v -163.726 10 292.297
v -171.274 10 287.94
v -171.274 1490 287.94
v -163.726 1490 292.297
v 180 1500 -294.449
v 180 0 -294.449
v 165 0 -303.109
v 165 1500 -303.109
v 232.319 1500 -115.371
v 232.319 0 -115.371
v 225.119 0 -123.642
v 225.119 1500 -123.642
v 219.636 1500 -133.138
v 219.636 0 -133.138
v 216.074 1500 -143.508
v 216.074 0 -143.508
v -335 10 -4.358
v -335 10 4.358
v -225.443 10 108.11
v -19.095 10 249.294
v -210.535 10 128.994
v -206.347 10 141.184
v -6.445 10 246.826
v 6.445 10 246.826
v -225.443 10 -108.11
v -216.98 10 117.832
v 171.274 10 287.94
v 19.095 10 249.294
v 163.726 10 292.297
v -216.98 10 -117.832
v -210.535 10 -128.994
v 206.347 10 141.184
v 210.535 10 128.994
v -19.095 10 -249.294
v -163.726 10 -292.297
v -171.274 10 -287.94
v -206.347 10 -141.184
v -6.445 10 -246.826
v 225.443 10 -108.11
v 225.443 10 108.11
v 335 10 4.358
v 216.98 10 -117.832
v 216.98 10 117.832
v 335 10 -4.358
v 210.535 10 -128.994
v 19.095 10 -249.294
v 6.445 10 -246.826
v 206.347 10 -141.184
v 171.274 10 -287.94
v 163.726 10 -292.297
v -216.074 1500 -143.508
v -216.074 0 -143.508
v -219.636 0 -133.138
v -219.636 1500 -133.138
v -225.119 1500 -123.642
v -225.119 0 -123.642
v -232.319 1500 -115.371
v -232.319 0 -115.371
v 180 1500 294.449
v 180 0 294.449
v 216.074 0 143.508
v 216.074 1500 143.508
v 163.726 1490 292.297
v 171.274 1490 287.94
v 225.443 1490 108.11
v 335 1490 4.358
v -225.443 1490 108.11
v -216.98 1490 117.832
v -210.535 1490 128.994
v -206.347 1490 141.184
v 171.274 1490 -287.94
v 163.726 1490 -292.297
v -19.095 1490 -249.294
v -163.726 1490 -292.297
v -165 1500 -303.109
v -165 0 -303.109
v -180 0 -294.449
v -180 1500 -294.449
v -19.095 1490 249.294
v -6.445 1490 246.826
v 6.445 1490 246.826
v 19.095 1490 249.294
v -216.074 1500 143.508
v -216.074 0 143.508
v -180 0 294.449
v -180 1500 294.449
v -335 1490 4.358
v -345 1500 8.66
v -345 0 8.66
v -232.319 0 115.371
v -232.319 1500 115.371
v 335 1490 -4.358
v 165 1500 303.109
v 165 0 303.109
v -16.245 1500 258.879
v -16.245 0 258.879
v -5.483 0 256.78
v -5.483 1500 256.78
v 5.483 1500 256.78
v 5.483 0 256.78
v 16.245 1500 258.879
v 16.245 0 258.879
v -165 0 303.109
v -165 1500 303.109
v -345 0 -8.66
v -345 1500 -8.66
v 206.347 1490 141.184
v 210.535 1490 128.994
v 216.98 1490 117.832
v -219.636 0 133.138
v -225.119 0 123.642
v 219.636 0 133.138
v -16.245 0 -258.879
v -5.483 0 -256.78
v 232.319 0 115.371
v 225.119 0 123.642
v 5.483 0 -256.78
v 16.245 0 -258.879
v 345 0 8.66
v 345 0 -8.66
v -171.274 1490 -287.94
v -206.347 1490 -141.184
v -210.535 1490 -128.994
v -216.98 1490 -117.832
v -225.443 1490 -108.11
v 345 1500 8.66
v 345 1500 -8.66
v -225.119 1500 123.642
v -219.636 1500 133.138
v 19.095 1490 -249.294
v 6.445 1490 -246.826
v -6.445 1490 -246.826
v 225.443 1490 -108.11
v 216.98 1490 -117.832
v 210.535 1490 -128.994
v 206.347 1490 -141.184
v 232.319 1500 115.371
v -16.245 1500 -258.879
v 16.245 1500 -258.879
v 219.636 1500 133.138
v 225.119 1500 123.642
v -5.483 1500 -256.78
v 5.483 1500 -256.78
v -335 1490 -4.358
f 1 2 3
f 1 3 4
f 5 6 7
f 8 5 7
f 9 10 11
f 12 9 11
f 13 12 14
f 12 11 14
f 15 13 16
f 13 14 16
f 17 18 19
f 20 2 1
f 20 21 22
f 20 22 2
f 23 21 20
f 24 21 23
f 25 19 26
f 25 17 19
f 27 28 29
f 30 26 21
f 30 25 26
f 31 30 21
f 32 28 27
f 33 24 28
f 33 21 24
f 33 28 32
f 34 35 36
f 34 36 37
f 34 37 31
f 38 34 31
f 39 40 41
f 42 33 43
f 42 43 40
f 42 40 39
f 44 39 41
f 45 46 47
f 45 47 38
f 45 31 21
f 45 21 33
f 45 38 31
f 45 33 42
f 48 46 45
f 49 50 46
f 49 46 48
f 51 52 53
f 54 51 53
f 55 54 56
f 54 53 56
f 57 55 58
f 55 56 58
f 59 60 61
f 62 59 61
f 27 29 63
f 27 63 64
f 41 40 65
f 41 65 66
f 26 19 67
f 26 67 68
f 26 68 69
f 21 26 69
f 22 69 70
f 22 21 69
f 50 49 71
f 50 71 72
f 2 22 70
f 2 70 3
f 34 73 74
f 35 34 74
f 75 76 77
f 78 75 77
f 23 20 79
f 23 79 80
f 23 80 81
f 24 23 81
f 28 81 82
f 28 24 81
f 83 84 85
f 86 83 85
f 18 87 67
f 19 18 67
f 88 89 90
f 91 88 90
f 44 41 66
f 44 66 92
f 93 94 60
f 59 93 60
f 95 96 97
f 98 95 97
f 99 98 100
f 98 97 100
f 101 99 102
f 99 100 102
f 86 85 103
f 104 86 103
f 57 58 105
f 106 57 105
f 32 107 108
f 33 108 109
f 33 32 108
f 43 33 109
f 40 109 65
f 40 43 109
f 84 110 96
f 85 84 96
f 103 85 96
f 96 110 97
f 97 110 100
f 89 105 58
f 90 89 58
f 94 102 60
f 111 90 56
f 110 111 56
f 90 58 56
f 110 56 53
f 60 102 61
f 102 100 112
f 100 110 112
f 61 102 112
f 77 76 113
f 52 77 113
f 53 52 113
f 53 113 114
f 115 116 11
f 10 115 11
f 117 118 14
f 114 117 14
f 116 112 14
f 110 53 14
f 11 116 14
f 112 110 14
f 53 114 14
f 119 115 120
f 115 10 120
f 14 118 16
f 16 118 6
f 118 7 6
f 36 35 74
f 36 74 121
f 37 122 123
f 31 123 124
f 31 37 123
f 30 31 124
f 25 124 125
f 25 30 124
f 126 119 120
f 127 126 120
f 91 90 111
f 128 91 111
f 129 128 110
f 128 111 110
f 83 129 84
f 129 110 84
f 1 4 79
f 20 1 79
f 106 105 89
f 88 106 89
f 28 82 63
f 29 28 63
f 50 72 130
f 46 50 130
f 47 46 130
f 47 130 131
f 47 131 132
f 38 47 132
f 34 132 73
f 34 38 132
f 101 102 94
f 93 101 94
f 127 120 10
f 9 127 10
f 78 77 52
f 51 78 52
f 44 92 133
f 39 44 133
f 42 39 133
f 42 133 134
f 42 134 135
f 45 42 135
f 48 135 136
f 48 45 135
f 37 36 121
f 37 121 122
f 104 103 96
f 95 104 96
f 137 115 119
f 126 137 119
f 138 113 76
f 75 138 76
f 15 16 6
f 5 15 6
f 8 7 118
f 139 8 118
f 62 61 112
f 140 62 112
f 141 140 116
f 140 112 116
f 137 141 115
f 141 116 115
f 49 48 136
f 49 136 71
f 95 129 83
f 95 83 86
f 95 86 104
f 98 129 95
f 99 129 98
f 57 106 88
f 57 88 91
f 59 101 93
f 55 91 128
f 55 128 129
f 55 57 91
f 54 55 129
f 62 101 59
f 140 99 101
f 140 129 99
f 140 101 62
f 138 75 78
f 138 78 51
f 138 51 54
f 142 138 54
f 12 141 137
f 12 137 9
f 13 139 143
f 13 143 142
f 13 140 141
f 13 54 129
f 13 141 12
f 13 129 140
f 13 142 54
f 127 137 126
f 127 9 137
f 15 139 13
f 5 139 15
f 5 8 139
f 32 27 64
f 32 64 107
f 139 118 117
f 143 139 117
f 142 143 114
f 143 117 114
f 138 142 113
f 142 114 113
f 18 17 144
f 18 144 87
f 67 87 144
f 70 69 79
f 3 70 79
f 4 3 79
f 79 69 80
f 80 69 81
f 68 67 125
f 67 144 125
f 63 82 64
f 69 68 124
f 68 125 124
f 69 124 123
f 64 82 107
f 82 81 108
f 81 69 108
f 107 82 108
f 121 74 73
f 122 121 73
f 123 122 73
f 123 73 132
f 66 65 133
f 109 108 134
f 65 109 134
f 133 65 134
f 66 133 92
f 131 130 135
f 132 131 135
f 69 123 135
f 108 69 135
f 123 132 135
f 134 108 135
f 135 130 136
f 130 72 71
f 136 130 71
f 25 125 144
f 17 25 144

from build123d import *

# Parameters (mm, degrees)
EXTRUDE_1_DEPTH     = 1500
CUT_EXTRUDE_4_DEPTH = 1500
SHELL_3_T           = 10


with BuildPart() as part:
    # 草图2 → 凸台-拉伸1 (new body)
    with BuildSketch(Plane(origin=(0, 0, 0), x_dir=(1, 0, 0), z_dir=(0, 1, 0))):
        Polygon((345, 8.660254038), (180, 294.448637287), (165, 303.108891325), (-165, 303.108891325), (-180, 294.448637287), (-345, 8.660254038), (-345, -8.660254038), (-180, -294.448637287), (-165, -303.108891325), (165, -303.108891325), (180, -294.448637287), (345, -8.660254038), align=None)
    extrude(amount=EXTRUDE_1_DEPTH)

    # 草图5 → 切除-拉伸4 (cut)
    with BuildSketch(Plane(origin=(0, 0, 0), x_dir=(1, 0, 0), z_dir=(0, 1, 0))):
        with BuildLine():
            Line((165, 303.108891325), (16.245071573, 258.879313504))
            ThreePointArc((16.245071573, 258.879313504), (0, 256.515365505), (-16.245071573, 258.879313504))
            Line((-16.245071573, 258.879313504), (-165, 303.108891325))
            Line((-165, 303.108891325), (-165, 323.92213511))
            Line((-165, 323.92213511), (-16.245047342, 368.151648331))
            ThreePointArc((-16.245047342, 368.151648331), (0, 370.515589126), (16.245047342, 368.151648331))
            Line((16.245047342, 368.151648331), (165, 323.92213511))
            Line((165, 323.92213511), (165, 303.108891325))
        make_face()
        with BuildLine():
            Line((198.024797853, 304.855259179), (310.706156229, 198.14444785))
            ThreePointArc((310.706156229, 198.14444785), (320.875912682, 185.257794563), (326.951203571, 170.007200482))
            Line((326.951203571, 170.007200482), (363.024797853, 19.06687593))
            Line((363.024797853, 19.06687593), (345, 8.660254038))
            Line((345, 8.660254038), (232.318597795, 115.371012084))
            ThreePointArc((232.318597795, 115.371012084), (222.148822988, 128.257682752), (216.073526222, 143.50830142))
            Line((216.073526222, 143.50830142), (180, 294.448637287))
            Line((180, 294.448637287), (198.024797853, 304.855259179))
        make_face()
        with BuildLine():
            Line((363.024797853, -19.06687593), (326.951203571, -170.007200482))
            ThreePointArc((326.951203571, -170.007200482), (320.875912682, -185.257794563), (310.706156229, -198.14444785))
            Line((310.706156229, -198.14444785), (198.024797853, -304.855259179))
            Line((198.024797853, -304.855259179), (180, -294.448637287))
            Line((180, -294.448637287), (216.073526222, -143.50830142))
            ThreePointArc((216.073526222, -143.50830142), (222.148822988, -128.257682752), (232.318597795, -115.371012084))
            Line((232.318597795, -115.371012084), (345, -8.660254038))
            Line((345, -8.660254038), (363.024797853, -19.06687593))
        make_face()
        with BuildLine():
            Line((165, -323.92213511), (16.245047342, -368.151648331))
            ThreePointArc((16.245047342, -368.151648331), (0, -370.515589126), (-16.245047342, -368.151648331))
            Line((-16.245047342, -368.151648331), (-165, -323.92213511))
            Line((-165, -323.92213511), (-165, -303.108891325))
            Line((-165, -303.108891325), (-16.245071573, -258.879313504))
            ThreePointArc((-16.245071573, -258.879313504), (0, -256.515365505), (16.245071573, -258.879313504))
            Line((16.245071573, -258.879313504), (165, -303.108891325))
            Line((165, -303.108891325), (165, -323.92213511))
        make_face()
        with BuildLine():
            Line((-198.024797853, -304.855259179), (-310.706156229, -198.14444785))
            ThreePointArc((-310.706156229, -198.14444785), (-320.875912682, -185.257794563), (-326.951203571, -170.007200482))
            Line((-326.951203571, -170.007200482), (-363.024797853, -19.06687593))
            Line((-363.024797853, -19.06687593), (-345, -8.660254038))
            Line((-345, -8.660254038), (-232.318597795, -115.371012084))
            ThreePointArc((-232.318597795, -115.371012084), (-222.148822988, -128.257682752), (-216.073526222, -143.50830142))
            Line((-216.073526222, -143.50830142), (-180, -294.448637287))
            Line((-180, -294.448637287), (-198.024797853, -304.855259179))
        make_face()
        with BuildLine():
            Line((-363.024797853, 19.06687593), (-326.951203571, 170.007200482))
            ThreePointArc((-326.951203571, 170.007200482), (-320.875912682, 185.257794563), (-310.706156229, 198.14444785))
            Line((-310.706156229, 198.14444785), (-198.024797853, 304.855259179))
            Line((-198.024797853, 304.855259179), (-180, 294.448637287))
            Line((-180, 294.448637287), (-216.073526222, 143.50830142))
            ThreePointArc((-216.073526222, 143.50830142), (-222.148822988, 128.257682752), (-232.318597795, 115.371012084))
            Line((-232.318597795, 115.371012084), (-345, 8.660254038))
            Line((-345, 8.660254038), (-363.024797853, 19.06687593))
        make_face()
    extrude(amount=CUT_EXTRUDE_4_DEPTH, mode=Mode.SUBTRACT)

    # 抽壳3 (no face opened: a closed hollow body)
    add(offset(amount=-SHELL_3_T, mode=Mode.PRIVATE), mode=Mode.SUBTRACT)


solid = part.part
